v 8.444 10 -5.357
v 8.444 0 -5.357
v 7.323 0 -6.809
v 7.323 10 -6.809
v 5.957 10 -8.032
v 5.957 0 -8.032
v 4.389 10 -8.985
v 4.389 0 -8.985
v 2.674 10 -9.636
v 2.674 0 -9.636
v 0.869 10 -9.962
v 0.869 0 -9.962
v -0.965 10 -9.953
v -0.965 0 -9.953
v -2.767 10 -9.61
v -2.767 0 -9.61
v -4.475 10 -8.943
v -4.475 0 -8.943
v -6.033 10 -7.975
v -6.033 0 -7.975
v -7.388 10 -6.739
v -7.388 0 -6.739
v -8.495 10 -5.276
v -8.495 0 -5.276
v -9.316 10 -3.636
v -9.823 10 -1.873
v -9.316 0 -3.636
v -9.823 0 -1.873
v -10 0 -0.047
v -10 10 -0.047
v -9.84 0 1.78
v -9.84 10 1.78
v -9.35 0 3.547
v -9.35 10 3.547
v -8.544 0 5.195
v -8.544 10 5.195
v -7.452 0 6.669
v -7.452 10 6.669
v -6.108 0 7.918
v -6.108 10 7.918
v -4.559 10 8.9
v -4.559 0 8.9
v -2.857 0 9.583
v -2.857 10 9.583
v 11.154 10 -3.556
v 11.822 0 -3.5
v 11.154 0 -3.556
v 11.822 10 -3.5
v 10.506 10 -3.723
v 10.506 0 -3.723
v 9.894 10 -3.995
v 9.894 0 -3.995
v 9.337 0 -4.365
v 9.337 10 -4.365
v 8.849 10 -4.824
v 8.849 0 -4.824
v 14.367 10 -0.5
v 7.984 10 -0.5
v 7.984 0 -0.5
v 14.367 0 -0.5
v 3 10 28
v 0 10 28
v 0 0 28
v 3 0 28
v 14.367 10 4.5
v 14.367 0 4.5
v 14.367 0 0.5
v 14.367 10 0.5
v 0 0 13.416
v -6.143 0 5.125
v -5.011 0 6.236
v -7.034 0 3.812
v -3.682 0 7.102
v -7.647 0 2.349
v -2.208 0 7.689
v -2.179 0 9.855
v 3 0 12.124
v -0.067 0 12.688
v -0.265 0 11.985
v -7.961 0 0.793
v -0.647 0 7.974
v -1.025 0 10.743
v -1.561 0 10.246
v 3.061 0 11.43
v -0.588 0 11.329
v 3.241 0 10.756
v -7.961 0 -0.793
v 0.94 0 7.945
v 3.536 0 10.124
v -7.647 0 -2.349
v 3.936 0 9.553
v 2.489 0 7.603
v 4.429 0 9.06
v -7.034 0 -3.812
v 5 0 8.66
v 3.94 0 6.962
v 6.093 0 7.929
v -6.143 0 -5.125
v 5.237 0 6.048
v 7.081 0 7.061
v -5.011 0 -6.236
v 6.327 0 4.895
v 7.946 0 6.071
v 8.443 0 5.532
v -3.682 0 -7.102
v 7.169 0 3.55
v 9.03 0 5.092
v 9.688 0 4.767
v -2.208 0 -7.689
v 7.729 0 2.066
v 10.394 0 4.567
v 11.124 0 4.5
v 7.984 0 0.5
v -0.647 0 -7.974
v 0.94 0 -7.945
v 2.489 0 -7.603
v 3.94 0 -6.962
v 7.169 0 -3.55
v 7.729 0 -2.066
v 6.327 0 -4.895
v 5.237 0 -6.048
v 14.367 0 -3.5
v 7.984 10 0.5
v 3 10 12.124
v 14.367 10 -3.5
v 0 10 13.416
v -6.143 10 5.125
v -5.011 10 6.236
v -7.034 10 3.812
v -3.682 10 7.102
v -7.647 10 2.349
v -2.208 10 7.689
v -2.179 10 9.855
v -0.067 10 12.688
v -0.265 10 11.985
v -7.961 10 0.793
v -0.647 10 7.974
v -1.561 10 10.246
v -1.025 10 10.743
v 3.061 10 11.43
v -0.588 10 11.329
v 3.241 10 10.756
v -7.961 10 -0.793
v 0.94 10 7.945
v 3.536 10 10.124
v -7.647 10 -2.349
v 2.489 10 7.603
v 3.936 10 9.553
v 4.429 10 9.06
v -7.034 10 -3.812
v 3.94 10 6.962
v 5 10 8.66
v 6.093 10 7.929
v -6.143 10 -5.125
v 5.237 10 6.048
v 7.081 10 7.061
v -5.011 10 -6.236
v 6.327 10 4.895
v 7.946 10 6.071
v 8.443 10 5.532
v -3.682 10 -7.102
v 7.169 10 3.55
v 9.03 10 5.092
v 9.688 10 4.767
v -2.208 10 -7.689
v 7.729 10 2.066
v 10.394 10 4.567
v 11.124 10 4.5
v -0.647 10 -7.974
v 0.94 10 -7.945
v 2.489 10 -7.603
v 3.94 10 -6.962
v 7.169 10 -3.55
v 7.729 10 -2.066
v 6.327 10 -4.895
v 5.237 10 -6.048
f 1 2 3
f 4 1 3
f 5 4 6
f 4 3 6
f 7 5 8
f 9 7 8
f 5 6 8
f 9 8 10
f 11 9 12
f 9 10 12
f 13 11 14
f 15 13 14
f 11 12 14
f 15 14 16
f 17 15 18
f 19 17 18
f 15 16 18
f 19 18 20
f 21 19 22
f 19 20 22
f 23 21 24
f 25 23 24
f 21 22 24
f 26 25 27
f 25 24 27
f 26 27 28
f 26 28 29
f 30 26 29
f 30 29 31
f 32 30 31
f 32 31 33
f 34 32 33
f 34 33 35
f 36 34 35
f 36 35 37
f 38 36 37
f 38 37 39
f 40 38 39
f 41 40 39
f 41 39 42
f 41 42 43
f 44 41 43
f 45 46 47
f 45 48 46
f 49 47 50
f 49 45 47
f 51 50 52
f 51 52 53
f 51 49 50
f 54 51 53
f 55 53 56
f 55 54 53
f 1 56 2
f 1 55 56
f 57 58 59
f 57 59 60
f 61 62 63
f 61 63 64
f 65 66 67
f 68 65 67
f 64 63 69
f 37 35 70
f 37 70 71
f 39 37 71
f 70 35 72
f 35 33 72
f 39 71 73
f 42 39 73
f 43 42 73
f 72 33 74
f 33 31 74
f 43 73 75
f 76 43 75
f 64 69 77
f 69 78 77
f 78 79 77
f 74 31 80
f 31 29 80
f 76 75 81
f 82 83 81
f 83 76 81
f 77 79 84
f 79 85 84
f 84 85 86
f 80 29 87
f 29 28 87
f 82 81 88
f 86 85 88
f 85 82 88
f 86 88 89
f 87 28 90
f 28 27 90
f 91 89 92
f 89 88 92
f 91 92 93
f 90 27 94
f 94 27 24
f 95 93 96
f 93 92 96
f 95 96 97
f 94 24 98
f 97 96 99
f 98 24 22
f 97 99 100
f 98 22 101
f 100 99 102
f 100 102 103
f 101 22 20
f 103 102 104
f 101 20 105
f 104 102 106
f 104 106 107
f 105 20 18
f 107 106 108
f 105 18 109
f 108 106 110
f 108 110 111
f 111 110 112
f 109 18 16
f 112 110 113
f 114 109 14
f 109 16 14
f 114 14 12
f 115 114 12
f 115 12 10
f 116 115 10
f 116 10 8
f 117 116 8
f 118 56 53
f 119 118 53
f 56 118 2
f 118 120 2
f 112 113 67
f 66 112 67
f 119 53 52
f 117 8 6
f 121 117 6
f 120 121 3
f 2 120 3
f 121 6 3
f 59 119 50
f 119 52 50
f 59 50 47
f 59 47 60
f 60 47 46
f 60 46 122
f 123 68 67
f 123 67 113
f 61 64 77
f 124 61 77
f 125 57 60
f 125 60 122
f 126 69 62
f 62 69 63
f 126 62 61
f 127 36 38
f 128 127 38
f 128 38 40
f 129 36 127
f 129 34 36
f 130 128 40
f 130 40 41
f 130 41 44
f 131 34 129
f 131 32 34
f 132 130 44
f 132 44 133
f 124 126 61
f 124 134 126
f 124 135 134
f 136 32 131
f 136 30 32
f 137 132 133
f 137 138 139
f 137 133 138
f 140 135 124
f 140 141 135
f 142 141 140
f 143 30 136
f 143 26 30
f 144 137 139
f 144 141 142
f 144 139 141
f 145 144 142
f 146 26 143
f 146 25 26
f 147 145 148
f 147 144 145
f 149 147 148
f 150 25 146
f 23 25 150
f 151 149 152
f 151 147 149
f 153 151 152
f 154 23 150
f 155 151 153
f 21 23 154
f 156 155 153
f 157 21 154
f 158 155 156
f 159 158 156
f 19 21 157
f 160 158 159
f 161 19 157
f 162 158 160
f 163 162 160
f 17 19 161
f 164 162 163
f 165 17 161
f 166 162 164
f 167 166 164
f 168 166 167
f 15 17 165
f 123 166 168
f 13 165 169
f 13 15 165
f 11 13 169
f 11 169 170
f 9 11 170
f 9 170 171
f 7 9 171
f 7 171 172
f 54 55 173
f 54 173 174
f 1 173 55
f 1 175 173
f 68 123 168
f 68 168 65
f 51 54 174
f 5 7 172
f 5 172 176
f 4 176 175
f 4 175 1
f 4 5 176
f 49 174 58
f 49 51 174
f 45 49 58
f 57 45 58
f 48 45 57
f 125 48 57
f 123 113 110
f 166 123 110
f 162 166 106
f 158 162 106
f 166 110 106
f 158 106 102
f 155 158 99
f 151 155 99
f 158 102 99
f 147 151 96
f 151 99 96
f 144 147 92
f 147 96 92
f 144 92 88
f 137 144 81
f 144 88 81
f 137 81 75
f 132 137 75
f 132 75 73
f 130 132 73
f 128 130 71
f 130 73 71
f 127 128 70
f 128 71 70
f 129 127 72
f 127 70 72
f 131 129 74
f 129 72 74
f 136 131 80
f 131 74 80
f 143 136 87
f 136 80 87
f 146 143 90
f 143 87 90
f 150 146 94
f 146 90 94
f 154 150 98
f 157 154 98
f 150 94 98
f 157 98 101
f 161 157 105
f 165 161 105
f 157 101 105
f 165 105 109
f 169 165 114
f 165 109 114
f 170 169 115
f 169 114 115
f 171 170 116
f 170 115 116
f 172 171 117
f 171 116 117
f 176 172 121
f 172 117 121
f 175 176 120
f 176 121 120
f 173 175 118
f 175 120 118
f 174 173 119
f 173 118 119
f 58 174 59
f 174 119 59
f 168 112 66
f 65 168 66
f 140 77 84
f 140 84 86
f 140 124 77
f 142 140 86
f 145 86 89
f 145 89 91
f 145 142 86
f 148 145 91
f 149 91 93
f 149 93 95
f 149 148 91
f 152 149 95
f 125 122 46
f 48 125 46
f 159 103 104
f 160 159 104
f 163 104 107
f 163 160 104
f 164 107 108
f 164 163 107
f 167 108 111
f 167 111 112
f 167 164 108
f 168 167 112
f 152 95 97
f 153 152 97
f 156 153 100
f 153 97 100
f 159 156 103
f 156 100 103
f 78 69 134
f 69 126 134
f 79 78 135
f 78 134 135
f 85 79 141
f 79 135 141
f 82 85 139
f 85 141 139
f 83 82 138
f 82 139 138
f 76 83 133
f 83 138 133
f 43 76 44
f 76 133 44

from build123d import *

# Parameters (mm, degrees)
BOSS_EXTRUDE1_DEPTH = 10
FILLET1_R           = 4


with BuildPart() as part:
    # Sketch1 → Boss-Extrude1 (new body)
    with BuildSketch(Plane(origin=(0, 0, 0), x_dir=(1, 0, 0), z_dir=(0, 1, 0))):
        with BuildLine():
            Line((0, -10), (0, -28))
            Line((0, -28), (3, -28))
            Line((3, -28), (3, -9.539392014))
            ThreePointArc((3, -9.539392014), (6.47547653, -7.620249583), (8.93028555, -4.5))
            Line((8.93028555, -4.5), (14.367496998, -4.5))
            Line((14.367496998, -4.5), (14.367496998, -0.5))
            Line((14.367496998, -0.5), (9.987492178, -0.5))
            Line((9.987492178, -0.5), (7.984359711, -0.5))
            ThreePointArc((7.984359711, -0.5), (-8, 0), (7.984359711, 0.5))
            Line((7.984359711, 0.5), (9.987492178, 0.5))
            Line((9.987492178, 0.5), (14.367496998, 0.5))
            Line((14.367496998, 0.5), (14.367496998, 3.5))
            Line((14.367496998, 3.5), (9.367496998, 3.5))
            ThreePointArc((9.367496998, 3.5), (-8.215838363, 5.700877125), (0, -10))
        make_face()
    extrude(amount=BOSS_EXTRUDE1_DEPTH)

    # Fillet1
    fillet1_edges = [part.edges().sort_by_distance(p)[0] for p in [
        (8.93028555, 5, 4.5),
        (3, 5, 9.539392014),
        (0, 5, 10),
        (9.367496998, 5, -3.5),
    ]]
    fillet(fillet1_edges, radius=FILLET1_R)


solid = part.part
